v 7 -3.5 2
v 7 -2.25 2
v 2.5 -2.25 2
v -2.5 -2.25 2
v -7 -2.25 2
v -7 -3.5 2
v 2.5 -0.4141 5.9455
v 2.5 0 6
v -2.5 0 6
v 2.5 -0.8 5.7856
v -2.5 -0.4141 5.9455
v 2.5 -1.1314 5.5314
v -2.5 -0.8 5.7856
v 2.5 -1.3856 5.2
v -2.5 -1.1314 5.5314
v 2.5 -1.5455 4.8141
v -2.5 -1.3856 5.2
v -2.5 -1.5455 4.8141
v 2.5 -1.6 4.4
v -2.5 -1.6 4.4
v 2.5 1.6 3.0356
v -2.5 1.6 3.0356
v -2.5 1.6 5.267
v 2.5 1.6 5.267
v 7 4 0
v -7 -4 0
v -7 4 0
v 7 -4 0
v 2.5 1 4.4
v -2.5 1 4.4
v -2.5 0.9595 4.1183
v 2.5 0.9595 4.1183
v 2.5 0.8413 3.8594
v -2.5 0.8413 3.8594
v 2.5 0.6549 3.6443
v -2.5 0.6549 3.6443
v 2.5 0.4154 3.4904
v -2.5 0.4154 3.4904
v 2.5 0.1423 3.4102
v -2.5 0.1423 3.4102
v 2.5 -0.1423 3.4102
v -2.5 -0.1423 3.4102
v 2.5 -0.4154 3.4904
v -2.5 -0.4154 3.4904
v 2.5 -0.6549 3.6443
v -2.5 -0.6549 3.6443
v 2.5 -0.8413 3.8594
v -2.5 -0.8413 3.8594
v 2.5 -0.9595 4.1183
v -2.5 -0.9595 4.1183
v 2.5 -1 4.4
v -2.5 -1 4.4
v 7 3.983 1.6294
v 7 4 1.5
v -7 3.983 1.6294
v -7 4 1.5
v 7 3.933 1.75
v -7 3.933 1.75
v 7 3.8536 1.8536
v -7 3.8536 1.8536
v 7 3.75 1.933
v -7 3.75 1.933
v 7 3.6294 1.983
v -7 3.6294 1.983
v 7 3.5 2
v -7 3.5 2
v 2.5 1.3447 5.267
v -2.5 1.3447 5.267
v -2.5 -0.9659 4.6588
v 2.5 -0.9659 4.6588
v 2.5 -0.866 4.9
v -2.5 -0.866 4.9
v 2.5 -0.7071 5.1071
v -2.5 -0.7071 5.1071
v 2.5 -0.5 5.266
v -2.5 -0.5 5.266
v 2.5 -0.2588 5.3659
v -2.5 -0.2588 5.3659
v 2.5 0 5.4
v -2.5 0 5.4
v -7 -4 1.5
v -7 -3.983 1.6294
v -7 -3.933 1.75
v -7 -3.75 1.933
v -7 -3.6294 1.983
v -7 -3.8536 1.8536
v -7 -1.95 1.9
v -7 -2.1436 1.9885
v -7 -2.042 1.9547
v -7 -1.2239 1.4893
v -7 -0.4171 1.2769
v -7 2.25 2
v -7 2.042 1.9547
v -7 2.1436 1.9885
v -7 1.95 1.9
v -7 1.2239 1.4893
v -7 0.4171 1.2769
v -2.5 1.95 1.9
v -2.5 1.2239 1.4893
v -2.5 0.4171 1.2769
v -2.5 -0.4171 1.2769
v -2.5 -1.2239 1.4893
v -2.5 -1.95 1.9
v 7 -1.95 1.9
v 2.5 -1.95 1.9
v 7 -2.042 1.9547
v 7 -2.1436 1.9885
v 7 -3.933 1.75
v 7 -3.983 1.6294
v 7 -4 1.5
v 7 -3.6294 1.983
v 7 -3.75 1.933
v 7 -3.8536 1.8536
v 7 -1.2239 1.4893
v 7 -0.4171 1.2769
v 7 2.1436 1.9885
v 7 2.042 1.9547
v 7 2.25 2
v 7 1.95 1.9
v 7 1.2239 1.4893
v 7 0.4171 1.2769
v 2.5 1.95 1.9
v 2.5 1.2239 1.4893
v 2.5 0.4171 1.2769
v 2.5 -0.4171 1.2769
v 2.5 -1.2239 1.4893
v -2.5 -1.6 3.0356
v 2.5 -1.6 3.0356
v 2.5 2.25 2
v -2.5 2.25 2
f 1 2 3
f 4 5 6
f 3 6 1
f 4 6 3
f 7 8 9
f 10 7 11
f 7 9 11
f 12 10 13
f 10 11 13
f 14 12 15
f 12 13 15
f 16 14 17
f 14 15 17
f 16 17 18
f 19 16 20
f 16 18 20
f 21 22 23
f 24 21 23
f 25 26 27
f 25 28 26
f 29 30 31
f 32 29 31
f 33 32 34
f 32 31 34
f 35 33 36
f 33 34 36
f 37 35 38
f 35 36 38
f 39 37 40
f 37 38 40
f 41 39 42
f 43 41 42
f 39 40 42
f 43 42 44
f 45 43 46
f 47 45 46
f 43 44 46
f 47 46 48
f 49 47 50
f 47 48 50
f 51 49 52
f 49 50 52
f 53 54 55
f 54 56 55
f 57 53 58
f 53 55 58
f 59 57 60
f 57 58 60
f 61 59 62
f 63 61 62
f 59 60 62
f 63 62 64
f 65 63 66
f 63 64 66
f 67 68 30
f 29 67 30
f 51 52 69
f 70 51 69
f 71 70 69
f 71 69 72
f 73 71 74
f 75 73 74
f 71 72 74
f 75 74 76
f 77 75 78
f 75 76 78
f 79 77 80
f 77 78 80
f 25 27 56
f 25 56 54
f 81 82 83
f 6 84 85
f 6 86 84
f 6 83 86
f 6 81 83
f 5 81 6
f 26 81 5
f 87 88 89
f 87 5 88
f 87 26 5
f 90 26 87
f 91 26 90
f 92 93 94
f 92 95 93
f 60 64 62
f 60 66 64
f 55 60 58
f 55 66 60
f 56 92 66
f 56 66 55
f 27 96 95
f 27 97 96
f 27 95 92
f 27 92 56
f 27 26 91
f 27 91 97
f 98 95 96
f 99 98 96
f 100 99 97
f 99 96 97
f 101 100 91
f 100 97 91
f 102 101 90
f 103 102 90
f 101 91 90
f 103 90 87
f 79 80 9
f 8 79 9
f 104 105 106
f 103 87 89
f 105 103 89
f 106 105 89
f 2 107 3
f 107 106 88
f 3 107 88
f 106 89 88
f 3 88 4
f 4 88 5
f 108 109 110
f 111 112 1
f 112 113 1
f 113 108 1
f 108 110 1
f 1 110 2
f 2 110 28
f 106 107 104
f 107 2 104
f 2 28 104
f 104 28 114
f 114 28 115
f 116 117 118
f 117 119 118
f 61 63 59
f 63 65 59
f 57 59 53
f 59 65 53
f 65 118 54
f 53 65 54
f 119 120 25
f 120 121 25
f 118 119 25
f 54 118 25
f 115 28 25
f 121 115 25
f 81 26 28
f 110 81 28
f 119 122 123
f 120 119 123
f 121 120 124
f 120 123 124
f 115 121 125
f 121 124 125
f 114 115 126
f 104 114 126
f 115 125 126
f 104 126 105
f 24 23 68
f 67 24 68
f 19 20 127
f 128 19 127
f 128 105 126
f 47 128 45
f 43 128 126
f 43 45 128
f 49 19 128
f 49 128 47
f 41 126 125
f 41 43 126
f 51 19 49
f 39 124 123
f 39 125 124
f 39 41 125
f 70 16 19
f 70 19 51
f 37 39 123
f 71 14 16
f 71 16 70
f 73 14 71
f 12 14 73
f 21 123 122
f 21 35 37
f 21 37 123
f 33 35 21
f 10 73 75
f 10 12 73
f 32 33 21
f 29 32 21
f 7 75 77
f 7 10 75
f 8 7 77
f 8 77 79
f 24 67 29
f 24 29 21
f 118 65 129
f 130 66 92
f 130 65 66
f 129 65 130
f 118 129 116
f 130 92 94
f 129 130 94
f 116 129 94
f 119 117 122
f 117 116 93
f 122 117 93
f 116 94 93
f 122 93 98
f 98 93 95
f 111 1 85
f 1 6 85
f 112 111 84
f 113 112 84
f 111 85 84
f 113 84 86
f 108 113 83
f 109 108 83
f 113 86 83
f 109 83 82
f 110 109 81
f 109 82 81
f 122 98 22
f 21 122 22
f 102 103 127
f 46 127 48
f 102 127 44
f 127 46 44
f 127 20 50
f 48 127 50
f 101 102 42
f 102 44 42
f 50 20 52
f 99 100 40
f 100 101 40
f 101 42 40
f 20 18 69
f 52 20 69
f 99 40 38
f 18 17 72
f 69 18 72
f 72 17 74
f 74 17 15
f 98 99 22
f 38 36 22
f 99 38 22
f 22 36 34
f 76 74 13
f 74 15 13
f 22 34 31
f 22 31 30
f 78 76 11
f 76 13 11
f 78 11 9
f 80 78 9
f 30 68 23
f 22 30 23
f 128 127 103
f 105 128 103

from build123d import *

# Parameters (mm, degrees)
F0_W      = 14
F0_H      = 8
F1_DEPTH  = 6
F3_DEPTH  = 25
F5_DEPTH  = 15
F6_R      = 0.5
F7_W      = 6
F7_H      = 6
F8_DEPTH  = 2.5
F10_DEPTH = 25


with BuildPart() as f1:
    # F0 (on Top) → F1 (new body)
    with BuildSketch(Plane.XY):
        Rectangle(F0_W, F0_H)
    extrude(amount=F1_DEPTH)

    # F2 (on face) → F3 (cut, symmetric)
    with BuildSketch(Plane(origin=(-7, 0, 0), x_dir=(0, -1, 0), z_dir=(-1, 0, 0))):
        with BuildLine():
            Line((-2.8831406487, 6), (2.8831406487, 6))
            ThreePointArc((2.8831406487, 6), (0, 7.75), (-2.8831406487, 6))
        make_face()
        with BuildLine():
            ThreePointArc((-2.8831406487, 6), (-0.7721052039, 1.3430467925), (3.25, 4.5))
            ThreePointArc((3.25, 4.5), (3.1569532075, 5.2721052039), (2.8831406487, 6))
            Line((2.8831406487, 6), (-2.8831406487, 6))
        make_face()
    extrude(amount=F3_DEPTH, both=True, mode=Mode.SUBTRACT)

    # F4 (on face) → F5 (cut, symmetric)
    with BuildSketch(Plane(origin=(-7, 0, 0), x_dir=(0, -1, 0), z_dir=(-1, 0, 0))):
        with BuildLine():
            Line((8.3296196082, 2), (8.3296196082, 11.0180403529))
            Line((8.3296196082, 11.0180403529), (-8.3296196082, 11.0180403529))
            Line((-8.3296196082, 11.0180403529), (-8.3296196082, 2))
            Line((-8.3296196082, 2), (-4, 2))
            Line((-4, 2), (-4, 6))
            Line((-4, 6), (-2.8831406487, 6))
            ThreePointArc((-2.8831406487, 6), (-3.1858900819, 3.8576571119), (-2.0766559657, 2))
            Line((-2.0766559657, 2), (2.0766559657, 2))
            ThreePointArc((2.0766559657, 2), (3.1858900819, 3.8576571119), (2.8831406487, 6))
            Line((2.8831406487, 6), (4, 6))
            Line((4, 6), (4, 2))
            Line((4, 2), (8.3296196082, 2))
        make_face()
        with BuildLine():
            Line((-4, 6), (-4, 2))
            Line((-4, 2), (-2.0766559657, 2))
            ThreePointArc((-2.0766559657, 2), (-3.1858900819, 3.8576571119), (-2.8831406487, 6))
            Line((-2.8831406487, 6), (-4, 6))
        make_face()
        with BuildLine():
            Line((2.0766559657, 2), (4, 2))
            Line((4, 2), (4, 6))
            Line((4, 6), (2.8831406487, 6))
            ThreePointArc((2.8831406487, 6), (3.1858900819, 3.8576571119), (2.0766559657, 2))
        make_face()
    extrude(amount=F5_DEPTH, both=True, mode=Mode.SUBTRACT)

    # F6
    f6_edges = [f1.edges().sort_by_distance(p)[0] for p in [
        (0, 4, 2),
        (0, 2.076656, 2),
        (0, -2.076656, 2),
        (0, -4, 2),
    ]]
    fillet(f6_edges, radius=F6_R)

    # F7 (on Right) → F8 (join, symmetric)
    with BuildSketch(Plane.YZ):
        with Locations((0, 3)):
            Rectangle(F7_W, F7_H)
    extrude(amount=F8_DEPTH, both=True)

    # F9 (on face) → F10 (cut)
    with BuildSketch(Plane(origin=(-2.5, 0, 0), x_dir=(0, -1, 0), z_dir=(-1, 0, 0))):
        with BuildLine():
            Line((-1.3447056541, 5.2670448107), (-1, 4.4))
            ThreePointArc((-1, 4.4), (0, 3.4), (1, 4.4))
            ThreePointArc((1, 4.4), (0.7071067812, 5.1071067812), (0, 5.4))
            Line((0, 5.4), (0, 6))
            Line((0, 6), (-3, 6))
            Line((-3, 6), (-3, 2))
            Line((-3, 2), (-2.25, 2))
            ThreePointArc((-2.25, 2), (-2.091886117, 1.974341649), (-1.95, 1.9))
            Line((-1.95, 1.9), (-1.6, 3.035565484))
            Line((-1.6, 3.035565484), (-1.6, 4.4))
            Line((-1.6, 4.4), (-1.6, 5.2670448107))
            Line((-1.6, 5.2670448107), (-1.3447056541, 5.2670448107))
        make_face()
        with BuildLine():
            ThreePointArc((0, 6), (1.1313708499, 5.5313708499), (1.6, 4.4))
            Line((1.6, 4.4), (1.6, 3.035565484))
            Line((1.6, 3.035565484), (1.95, 1.9))
            ThreePointArc((1.95, 1.9), (2.091886117, 1.974341649), (2.25, 2))
            Line((2.25, 2), (3, 2))
            Line((3, 2), (3, 6))
            Line((3, 6), (0, 6))
        make_face()
    extrude(amount=-F10_DEPTH, mode=Mode.SUBTRACT)


solid = f1.part
